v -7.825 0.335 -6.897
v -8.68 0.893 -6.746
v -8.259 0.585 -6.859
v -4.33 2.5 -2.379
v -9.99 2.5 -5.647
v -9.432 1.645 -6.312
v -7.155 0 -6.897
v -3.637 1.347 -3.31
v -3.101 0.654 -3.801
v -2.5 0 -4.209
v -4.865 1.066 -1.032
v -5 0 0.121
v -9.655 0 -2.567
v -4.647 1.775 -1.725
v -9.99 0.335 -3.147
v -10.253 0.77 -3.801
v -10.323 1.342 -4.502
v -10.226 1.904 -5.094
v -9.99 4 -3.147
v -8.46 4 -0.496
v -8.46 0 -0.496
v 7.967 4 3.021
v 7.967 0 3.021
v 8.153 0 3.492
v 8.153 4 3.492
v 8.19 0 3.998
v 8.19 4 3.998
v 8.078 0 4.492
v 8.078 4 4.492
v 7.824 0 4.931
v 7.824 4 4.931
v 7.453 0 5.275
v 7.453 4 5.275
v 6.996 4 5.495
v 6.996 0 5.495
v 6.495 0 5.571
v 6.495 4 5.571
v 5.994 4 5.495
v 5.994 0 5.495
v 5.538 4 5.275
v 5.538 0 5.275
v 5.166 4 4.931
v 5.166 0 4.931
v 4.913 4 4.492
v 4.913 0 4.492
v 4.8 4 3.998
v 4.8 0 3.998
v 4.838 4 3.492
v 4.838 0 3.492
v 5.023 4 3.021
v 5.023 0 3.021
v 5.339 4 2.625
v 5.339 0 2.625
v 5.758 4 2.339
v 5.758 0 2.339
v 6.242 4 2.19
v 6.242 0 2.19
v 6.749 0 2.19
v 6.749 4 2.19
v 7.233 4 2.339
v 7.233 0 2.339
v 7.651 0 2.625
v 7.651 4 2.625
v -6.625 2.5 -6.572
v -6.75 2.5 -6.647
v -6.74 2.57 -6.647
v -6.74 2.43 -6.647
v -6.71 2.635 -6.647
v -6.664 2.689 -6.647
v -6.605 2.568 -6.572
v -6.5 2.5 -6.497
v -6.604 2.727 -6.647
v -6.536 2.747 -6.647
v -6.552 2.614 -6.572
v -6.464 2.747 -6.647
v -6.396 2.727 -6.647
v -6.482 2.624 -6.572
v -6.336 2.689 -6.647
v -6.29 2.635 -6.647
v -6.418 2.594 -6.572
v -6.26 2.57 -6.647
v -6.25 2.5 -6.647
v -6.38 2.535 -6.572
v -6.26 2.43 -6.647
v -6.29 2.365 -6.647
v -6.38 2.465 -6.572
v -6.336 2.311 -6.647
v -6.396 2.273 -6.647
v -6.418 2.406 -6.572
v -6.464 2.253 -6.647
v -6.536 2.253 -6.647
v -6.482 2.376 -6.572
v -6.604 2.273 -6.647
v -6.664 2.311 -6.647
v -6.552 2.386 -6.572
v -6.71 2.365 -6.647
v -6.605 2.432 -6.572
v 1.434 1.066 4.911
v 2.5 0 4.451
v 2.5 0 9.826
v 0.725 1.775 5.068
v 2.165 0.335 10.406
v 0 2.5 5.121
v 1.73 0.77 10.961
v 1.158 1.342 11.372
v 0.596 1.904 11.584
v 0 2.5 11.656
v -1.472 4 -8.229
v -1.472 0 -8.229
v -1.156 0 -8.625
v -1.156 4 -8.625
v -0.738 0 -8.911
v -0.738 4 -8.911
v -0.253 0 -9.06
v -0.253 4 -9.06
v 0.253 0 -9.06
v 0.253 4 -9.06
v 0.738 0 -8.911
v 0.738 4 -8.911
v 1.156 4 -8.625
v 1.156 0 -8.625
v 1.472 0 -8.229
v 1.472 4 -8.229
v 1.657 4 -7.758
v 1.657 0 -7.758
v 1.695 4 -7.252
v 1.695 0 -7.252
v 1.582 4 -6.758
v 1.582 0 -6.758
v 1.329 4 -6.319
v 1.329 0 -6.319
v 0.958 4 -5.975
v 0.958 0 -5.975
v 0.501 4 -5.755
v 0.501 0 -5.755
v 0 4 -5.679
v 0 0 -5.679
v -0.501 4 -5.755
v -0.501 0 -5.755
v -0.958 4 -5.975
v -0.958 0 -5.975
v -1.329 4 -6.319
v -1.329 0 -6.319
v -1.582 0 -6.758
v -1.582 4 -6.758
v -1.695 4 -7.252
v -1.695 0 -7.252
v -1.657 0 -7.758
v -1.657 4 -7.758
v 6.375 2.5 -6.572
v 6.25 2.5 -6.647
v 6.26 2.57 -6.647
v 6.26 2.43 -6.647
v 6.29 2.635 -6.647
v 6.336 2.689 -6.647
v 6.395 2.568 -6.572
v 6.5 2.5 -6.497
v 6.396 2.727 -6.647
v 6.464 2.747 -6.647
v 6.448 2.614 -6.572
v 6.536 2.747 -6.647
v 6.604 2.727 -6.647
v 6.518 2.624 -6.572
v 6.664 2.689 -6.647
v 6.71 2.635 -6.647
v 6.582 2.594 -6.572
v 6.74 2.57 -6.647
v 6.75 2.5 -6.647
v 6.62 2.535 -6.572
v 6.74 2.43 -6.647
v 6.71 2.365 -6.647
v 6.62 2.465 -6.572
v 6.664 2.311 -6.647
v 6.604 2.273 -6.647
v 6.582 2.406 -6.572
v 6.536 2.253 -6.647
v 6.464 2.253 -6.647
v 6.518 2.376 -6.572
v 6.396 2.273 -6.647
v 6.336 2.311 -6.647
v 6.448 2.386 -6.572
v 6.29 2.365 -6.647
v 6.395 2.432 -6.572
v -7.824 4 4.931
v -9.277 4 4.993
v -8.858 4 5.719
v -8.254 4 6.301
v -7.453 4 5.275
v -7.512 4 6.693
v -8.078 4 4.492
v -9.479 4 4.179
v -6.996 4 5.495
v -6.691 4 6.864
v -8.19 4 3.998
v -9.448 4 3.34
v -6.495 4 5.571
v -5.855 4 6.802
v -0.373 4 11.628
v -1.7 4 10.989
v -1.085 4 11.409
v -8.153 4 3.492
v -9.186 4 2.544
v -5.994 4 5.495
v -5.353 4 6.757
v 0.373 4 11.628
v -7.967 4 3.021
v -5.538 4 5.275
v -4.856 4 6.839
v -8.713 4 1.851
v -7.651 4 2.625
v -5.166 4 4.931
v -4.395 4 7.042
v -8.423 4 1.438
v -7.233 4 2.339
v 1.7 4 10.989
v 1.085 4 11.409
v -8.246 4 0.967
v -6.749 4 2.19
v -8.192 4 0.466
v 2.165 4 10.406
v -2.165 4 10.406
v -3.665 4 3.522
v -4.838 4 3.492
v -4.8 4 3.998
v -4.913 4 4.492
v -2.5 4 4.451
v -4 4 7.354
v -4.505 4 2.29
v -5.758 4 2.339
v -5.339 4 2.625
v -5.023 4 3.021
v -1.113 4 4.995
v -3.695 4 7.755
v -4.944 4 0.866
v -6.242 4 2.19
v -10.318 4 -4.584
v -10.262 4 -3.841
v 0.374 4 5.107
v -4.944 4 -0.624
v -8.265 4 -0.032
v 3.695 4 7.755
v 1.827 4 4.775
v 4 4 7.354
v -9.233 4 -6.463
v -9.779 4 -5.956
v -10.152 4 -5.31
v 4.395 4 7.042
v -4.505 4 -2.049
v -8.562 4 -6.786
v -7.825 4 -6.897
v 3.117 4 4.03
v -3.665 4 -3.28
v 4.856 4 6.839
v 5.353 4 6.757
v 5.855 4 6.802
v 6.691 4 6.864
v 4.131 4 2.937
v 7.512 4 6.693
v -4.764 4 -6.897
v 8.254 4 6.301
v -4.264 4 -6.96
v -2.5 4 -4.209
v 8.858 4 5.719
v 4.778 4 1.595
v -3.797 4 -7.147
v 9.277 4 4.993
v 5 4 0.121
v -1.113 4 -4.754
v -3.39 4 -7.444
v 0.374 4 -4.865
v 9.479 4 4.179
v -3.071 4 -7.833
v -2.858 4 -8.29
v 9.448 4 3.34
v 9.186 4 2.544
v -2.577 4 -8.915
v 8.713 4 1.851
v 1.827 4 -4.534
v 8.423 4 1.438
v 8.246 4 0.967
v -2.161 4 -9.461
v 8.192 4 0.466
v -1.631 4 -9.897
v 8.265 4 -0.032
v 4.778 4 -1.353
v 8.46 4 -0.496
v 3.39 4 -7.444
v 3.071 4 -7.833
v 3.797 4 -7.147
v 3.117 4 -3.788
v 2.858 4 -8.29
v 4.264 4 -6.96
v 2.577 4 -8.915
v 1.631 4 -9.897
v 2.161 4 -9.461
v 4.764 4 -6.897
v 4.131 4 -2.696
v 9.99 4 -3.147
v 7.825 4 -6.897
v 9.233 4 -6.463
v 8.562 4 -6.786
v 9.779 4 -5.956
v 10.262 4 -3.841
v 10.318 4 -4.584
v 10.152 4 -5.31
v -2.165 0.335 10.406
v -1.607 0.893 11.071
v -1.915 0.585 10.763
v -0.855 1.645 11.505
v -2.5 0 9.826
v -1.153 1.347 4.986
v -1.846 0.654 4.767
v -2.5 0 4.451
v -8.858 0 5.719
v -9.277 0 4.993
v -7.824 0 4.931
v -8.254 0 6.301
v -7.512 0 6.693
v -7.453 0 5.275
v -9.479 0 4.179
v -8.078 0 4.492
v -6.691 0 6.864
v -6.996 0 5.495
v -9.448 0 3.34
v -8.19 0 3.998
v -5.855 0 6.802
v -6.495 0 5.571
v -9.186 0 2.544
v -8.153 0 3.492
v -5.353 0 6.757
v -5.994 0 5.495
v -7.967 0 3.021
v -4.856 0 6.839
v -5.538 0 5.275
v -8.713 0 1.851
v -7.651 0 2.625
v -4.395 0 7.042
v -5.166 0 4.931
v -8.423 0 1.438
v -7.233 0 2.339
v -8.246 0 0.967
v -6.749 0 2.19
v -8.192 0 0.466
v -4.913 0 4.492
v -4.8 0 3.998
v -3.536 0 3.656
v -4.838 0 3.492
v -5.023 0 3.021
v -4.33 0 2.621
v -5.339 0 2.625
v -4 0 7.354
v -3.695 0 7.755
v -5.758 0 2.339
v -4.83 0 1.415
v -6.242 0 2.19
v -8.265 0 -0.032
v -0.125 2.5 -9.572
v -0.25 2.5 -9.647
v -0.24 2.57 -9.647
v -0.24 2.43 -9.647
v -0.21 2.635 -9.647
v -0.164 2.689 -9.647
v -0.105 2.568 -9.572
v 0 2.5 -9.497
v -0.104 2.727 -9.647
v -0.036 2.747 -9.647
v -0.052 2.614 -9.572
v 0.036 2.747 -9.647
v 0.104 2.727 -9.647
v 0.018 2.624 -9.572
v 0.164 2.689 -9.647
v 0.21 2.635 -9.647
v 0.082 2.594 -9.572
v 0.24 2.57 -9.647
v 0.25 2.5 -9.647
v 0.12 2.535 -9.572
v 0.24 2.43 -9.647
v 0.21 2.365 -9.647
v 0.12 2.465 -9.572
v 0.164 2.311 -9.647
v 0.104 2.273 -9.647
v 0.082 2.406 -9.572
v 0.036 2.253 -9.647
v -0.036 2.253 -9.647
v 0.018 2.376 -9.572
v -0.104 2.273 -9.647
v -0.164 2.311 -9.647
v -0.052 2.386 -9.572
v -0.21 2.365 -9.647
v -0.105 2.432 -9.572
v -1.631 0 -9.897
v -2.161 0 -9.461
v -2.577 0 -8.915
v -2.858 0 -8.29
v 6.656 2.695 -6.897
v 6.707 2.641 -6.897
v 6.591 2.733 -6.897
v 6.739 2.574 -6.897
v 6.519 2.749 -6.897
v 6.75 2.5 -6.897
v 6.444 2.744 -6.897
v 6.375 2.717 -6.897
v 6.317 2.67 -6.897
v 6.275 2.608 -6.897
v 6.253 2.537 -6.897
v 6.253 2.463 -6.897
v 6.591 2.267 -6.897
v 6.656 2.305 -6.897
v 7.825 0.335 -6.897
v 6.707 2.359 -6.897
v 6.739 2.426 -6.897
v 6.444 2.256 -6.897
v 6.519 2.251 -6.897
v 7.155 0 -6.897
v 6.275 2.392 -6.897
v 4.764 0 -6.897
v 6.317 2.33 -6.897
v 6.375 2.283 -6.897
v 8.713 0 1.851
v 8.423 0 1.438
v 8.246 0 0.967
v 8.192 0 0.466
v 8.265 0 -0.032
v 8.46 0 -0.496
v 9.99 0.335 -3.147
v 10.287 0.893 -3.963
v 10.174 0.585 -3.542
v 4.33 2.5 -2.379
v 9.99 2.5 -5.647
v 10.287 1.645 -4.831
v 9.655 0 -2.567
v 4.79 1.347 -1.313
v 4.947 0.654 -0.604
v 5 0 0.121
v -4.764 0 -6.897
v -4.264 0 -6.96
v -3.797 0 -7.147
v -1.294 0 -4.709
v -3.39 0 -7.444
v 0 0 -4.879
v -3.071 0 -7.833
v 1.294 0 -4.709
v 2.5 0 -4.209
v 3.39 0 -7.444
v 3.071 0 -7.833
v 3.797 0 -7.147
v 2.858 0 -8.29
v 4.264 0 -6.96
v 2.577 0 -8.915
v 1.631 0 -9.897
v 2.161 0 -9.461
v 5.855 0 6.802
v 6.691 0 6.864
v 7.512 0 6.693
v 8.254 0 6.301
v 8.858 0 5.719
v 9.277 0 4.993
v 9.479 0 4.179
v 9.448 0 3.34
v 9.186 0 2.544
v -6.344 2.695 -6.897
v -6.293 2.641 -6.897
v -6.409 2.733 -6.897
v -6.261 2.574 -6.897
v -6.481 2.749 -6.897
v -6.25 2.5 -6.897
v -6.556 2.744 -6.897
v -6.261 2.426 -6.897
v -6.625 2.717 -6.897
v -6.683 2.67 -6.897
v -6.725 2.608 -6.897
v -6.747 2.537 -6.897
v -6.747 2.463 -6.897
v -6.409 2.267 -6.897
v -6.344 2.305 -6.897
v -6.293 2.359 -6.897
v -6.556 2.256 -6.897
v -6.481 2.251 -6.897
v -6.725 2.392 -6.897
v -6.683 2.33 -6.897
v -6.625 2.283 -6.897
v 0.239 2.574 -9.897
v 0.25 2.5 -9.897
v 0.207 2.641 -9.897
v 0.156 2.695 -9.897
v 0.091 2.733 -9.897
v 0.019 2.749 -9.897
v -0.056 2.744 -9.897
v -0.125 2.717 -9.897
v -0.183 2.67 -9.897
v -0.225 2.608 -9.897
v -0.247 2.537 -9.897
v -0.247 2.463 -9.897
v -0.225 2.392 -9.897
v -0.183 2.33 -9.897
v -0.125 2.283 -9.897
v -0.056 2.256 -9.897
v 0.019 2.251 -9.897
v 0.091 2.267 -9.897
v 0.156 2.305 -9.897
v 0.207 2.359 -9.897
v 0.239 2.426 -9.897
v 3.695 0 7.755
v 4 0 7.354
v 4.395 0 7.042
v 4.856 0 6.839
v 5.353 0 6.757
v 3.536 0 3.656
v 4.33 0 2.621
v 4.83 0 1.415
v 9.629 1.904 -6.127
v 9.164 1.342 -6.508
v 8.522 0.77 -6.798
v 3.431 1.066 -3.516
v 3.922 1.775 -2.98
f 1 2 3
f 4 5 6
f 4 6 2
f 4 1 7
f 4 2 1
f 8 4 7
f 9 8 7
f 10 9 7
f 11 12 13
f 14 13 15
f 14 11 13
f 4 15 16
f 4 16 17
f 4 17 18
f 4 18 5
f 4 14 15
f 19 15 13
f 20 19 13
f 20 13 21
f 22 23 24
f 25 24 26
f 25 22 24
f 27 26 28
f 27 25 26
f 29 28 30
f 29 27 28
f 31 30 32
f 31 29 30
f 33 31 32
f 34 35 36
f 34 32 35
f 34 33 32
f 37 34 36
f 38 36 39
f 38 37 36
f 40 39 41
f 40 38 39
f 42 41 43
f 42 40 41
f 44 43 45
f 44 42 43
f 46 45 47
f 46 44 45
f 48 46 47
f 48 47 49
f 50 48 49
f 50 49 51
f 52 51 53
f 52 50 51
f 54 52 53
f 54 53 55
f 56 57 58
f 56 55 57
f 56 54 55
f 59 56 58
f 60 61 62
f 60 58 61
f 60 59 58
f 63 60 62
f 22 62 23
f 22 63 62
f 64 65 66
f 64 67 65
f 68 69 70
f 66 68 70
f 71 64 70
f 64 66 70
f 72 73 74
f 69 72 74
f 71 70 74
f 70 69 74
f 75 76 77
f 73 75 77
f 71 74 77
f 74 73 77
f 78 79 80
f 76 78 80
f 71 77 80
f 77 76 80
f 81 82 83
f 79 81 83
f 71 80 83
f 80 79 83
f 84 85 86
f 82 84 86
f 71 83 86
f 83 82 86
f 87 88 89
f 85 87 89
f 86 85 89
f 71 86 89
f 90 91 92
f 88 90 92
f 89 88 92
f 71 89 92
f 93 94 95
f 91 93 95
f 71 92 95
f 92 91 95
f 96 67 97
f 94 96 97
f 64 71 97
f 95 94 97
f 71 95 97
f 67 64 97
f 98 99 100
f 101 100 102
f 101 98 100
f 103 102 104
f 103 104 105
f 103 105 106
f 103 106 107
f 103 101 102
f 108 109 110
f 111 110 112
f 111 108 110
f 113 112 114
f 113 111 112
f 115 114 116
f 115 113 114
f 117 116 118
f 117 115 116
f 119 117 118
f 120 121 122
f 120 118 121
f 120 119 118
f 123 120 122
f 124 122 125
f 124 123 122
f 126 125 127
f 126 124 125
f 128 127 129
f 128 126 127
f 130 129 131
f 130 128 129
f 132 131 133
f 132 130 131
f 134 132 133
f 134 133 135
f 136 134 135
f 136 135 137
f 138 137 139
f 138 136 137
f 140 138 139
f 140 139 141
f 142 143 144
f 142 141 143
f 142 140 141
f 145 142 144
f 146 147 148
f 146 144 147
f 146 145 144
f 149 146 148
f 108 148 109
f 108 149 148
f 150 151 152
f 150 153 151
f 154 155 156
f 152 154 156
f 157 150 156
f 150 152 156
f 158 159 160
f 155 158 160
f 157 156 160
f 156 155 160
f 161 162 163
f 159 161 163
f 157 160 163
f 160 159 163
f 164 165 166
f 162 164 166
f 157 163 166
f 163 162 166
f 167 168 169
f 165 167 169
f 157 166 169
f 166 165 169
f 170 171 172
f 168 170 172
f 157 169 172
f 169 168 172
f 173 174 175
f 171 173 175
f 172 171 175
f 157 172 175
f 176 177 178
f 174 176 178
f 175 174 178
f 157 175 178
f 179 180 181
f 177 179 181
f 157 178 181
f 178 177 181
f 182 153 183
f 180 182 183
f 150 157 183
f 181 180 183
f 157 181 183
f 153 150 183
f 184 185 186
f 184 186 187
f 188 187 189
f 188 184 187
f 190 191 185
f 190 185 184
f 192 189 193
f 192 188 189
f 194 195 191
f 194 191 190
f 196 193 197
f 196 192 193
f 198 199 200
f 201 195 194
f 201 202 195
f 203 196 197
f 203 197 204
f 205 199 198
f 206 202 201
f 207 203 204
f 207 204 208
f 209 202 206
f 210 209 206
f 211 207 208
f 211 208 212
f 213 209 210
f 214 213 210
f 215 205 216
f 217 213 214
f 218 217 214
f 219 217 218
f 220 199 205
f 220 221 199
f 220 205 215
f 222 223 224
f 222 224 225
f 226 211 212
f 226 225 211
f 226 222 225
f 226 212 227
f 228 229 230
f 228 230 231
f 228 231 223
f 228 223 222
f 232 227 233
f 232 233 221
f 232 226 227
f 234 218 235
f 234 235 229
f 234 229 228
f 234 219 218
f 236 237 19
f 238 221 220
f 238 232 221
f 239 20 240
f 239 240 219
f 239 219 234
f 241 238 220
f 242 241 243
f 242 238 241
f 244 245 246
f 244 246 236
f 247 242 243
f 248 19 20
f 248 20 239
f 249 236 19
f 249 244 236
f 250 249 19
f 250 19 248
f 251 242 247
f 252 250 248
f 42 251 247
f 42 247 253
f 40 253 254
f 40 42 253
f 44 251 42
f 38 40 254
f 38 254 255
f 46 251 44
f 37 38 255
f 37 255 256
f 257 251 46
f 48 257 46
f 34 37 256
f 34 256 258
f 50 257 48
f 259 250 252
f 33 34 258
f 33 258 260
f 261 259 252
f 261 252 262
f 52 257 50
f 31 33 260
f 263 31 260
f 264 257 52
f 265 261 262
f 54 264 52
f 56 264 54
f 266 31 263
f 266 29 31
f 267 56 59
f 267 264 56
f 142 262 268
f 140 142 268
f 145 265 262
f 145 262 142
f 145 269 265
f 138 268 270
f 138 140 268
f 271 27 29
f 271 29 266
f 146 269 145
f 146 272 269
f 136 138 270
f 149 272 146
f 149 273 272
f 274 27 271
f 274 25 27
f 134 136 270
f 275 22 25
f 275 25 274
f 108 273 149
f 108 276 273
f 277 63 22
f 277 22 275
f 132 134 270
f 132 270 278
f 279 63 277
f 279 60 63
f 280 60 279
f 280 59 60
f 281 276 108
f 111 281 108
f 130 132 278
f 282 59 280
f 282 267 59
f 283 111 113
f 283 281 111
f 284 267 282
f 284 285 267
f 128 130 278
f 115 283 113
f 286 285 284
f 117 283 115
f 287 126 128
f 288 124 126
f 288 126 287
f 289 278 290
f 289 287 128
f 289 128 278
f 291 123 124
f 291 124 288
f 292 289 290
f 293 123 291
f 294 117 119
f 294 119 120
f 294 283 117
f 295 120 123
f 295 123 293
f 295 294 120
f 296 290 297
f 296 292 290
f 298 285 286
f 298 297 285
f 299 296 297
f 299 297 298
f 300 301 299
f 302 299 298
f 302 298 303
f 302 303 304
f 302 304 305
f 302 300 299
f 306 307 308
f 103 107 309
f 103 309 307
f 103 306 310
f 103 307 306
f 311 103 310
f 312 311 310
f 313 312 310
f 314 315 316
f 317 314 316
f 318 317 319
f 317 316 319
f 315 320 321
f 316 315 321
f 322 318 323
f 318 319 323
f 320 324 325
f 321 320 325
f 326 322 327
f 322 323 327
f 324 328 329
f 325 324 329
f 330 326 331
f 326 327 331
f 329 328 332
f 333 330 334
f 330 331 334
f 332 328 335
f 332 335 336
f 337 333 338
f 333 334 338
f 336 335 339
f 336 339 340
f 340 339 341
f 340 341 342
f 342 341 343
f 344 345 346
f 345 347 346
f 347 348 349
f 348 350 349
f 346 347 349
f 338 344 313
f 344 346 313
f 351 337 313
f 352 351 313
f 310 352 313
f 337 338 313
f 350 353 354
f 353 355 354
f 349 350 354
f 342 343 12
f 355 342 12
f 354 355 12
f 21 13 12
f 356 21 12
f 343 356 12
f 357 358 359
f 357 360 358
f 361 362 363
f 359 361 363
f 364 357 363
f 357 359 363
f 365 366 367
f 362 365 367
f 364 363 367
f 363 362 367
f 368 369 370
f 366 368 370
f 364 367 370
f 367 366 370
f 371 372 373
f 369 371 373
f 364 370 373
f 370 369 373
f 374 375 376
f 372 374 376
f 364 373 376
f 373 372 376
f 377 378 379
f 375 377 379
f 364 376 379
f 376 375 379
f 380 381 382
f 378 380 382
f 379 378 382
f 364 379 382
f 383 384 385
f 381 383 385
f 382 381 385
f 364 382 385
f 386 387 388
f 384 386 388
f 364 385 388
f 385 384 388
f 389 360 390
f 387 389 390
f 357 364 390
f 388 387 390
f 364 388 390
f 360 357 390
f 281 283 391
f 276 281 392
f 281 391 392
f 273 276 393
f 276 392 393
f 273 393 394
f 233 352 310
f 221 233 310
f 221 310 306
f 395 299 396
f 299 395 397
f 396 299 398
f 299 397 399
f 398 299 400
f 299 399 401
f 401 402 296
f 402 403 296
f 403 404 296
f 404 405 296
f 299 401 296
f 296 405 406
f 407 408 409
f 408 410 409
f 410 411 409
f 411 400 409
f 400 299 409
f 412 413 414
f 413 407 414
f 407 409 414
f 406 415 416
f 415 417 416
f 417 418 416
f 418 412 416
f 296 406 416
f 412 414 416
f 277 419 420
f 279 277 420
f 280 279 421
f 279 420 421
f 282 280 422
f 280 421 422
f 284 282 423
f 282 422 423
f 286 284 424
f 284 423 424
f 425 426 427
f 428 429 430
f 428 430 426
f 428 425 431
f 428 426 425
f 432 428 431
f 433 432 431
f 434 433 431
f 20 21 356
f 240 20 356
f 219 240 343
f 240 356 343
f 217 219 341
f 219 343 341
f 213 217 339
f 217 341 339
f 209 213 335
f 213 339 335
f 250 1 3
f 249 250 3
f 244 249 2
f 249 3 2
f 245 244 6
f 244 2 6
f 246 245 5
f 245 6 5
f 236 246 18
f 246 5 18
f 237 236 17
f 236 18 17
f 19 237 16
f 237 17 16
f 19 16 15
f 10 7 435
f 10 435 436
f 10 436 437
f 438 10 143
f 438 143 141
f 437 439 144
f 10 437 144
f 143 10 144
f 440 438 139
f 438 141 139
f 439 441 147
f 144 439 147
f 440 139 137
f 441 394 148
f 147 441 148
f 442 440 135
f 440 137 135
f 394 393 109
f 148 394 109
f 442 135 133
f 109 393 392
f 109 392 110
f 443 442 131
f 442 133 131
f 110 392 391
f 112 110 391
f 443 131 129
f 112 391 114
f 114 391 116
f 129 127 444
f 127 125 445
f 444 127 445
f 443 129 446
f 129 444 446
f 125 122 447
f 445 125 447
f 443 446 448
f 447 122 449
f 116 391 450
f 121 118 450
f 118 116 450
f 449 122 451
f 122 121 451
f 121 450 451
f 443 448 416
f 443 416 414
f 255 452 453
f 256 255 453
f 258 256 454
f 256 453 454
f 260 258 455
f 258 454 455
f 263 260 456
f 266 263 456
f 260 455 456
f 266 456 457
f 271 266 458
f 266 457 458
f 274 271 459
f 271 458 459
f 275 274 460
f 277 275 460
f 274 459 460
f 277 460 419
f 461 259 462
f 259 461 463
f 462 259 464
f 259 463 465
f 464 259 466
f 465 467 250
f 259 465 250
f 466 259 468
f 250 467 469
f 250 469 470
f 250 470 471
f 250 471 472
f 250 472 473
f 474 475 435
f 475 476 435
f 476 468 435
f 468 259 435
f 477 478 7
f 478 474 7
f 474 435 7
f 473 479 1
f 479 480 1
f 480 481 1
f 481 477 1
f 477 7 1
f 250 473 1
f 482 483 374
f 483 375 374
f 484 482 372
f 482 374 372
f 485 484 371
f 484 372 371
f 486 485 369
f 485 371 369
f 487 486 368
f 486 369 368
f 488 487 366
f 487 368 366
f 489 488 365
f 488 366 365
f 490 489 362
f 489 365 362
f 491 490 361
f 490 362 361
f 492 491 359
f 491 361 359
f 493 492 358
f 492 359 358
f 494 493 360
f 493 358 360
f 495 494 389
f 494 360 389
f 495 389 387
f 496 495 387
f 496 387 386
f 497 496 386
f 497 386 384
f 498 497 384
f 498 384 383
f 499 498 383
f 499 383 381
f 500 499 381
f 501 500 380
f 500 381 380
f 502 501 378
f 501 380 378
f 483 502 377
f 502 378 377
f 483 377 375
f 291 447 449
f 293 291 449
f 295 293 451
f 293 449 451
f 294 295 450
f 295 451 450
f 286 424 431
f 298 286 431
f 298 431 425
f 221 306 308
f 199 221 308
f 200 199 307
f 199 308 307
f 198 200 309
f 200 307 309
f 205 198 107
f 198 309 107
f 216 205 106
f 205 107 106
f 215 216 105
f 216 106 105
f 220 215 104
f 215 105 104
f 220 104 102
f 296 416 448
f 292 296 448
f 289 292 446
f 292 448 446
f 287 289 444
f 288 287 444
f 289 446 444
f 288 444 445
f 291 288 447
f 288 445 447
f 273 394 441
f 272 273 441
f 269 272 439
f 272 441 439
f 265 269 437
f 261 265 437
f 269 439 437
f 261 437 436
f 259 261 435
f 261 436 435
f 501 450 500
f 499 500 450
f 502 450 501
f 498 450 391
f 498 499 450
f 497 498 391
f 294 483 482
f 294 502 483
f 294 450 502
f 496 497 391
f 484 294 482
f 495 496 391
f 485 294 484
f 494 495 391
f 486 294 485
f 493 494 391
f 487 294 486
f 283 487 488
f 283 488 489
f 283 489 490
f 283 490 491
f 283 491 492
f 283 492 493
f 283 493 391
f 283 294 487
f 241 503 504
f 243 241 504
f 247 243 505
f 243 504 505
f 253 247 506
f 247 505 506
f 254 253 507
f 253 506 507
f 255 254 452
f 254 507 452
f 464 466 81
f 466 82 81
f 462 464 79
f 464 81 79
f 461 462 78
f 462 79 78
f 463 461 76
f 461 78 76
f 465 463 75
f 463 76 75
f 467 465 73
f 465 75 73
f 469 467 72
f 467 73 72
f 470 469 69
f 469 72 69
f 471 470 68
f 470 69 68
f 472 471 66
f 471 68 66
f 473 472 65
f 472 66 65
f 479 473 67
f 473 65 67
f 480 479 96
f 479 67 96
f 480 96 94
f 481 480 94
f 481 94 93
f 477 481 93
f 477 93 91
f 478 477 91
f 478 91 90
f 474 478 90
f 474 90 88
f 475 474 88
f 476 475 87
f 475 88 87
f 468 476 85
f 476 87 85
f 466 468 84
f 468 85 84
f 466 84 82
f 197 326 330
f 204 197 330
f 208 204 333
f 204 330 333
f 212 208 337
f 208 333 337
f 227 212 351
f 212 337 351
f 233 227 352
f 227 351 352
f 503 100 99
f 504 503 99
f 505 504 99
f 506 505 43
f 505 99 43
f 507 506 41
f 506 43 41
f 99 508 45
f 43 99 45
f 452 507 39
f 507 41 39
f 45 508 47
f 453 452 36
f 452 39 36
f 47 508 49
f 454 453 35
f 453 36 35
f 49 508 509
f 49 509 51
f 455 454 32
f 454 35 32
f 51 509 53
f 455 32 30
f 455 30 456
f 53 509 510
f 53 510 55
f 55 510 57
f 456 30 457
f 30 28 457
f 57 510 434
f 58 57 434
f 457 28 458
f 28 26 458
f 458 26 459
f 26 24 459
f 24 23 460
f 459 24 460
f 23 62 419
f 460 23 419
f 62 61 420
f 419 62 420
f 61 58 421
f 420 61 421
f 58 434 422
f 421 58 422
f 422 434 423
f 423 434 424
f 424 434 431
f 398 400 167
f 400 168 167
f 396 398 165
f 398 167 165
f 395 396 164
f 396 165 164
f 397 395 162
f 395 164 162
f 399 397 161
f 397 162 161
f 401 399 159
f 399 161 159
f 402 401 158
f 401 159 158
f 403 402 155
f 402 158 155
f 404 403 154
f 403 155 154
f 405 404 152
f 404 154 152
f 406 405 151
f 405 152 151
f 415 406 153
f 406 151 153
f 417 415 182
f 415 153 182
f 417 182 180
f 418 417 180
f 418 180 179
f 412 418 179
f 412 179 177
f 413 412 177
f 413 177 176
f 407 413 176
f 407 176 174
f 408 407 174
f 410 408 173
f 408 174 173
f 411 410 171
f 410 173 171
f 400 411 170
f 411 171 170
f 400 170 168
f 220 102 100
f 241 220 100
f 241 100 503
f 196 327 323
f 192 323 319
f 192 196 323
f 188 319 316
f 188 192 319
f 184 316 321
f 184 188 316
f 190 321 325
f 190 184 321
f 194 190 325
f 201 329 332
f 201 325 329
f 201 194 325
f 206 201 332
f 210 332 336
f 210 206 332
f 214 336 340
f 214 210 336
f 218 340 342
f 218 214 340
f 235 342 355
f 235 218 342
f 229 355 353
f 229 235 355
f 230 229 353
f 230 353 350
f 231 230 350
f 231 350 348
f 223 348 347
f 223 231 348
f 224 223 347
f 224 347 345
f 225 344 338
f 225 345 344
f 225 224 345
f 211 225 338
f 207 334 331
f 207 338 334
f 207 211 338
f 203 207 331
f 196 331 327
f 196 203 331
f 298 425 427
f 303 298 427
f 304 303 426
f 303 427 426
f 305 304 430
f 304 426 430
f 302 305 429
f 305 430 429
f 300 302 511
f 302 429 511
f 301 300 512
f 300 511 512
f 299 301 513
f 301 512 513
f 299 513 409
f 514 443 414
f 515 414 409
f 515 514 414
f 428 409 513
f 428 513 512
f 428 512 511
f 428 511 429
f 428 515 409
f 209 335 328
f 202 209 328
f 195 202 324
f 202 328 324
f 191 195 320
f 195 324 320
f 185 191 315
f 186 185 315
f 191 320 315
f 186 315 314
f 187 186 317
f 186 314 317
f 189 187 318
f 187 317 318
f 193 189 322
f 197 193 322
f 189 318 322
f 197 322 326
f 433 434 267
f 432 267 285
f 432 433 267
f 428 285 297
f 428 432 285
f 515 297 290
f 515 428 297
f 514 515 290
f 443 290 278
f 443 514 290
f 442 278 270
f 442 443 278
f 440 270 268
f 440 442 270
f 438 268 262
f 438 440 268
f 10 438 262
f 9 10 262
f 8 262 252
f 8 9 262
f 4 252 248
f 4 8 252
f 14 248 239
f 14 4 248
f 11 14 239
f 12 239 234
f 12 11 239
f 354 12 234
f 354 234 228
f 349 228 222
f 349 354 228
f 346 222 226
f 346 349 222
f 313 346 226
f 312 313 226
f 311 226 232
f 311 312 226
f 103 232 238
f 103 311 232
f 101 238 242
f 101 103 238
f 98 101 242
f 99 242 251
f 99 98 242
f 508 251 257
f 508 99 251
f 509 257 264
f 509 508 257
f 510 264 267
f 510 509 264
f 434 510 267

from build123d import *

# Parameters (mm, degrees)
SKETCH1_R                      = 5
EXTRUDE1_DEPTH                 = 4
CIRPATTERN2_COUNT              = 3
EXTRUDE4_START                 = 4.45086
EXTRUDE4_DEPTH                 = 7.205259
EXTRUDE5_START                 = 4.330127
EXTRUDE5_DEPTH                 = 7.205258
EXTRUDE6_START                 = 4.330127
EXTRUDE6_DEPTH                 = 7.205258
SKETCH11_W                     = 14.943105969
SKETCH11_H                     = 2.182700872
EXTRUDE7_DEPTH                 = 10
F_0_5_0_5_DIAMETER_HOLE1_D     = 0.5
F_0_5_0_5_DIAMETER_HOLE1_DEPTH = 0.25
F_0_5_0_5_DIAMETER_HOLE1_TIP   = 0.150215155
F_0_5_0_5_DIAMETER_HOLE2_D     = 0.5
F_0_5_0_5_DIAMETER_HOLE2_DEPTH = 0.25
F_0_5_0_5_DIAMETER_HOLE2_TIP   = 0.150215155
F_0_5_0_5_DIAMETER_HOLE3_D     = 0.5
F_0_5_0_5_DIAMETER_HOLE3_DEPTH = 0.25
F_0_5_0_5_DIAMETER_HOLE3_TIP   = 0.150215155


with BuildPart() as part:
    # Sketch1 → Extrude1 (new body)
    with BuildSketch(Plane(origin=(0, 0, 0), x_dir=(1, 0, 0), z_dir=(0, 1, 0))):
        with BuildLine():
            Line((-9.989936491, 3.146959138), (-8.459547932, 0.4962484))
            ThreePointArc((-8.459547932, 0.4962484), (-8.203164753, -0.718531203), (-8.713035455, -1.850544314))
            ThreePointArc((-8.713035455, -1.850544314), (-9.09326674, -5.370733384), (-5.854577936, -6.801537968))
            ThreePointArc((-5.854577936, -6.801537968), (-4.619290473, -6.925983542), (-3.695452068, -7.75540769))
            Line((-3.695452068, -7.75540769), (-2.165063509, -10.406118428))
            ThreePointArc((-2.165063509, -10.406118428), (0, -11.656118428), (2.165063509, -10.406118428))
            Line((2.165063509, -10.406118428), (3.695452068, -7.75540769))
            ThreePointArc((3.695452068, -7.75540769), (4.619290473, -6.925983542), (5.854577936, -6.801537968))
            ThreePointArc((5.854577936, -6.801537968), (9.09326674, -5.370733384), (8.713035455, -1.850544314))
            ThreePointArc((8.713035455, -1.850544314), (8.203164753, -0.718531203), (8.459547932, 0.4962484))
            Line((8.459547932, 0.4962484), (9.989936491, 3.146959138))
            ThreePointArc((9.989936491, 3.146959138), (9.989936491, 5.646959138), (7.824872981, 6.896959138))
            Line((7.824872981, 6.896959138), (4.764095865, 6.896959138))
            ThreePointArc((4.764095865, 6.896959138), (3.583874279, 7.282314592), (2.858457519, 8.289882129))
            ThreePointArc((2.858457519, 8.289882129), (0, 10.379266616), (-2.858457519, 8.289882129))
            ThreePointArc((-2.858457519, 8.289882129), (-3.583874279, 7.282314592), (-4.764095865, 6.896959138))
            Line((-4.764095865, 6.896959138), (-7.824872981, 6.896959138))
            ThreePointArc((-7.824872981, 6.896959138), (-9.989936491, 5.646959138), (-9.989936491, 3.146959138))
        make_face()
        with Locations((0, -0.120733384)):
            Circle(SKETCH1_R, mode=Mode.SUBTRACT)
    extrude(amount=EXTRUDE1_DEPTH)

    # Sketch6 → M3 Clearance Hole1 (revolve, cut)
    with BuildSketch(Plane(origin=(-6.495190528, 4, 3.870733384), x_dir=(0, 0, 1), z_dir=(1, 0, 0))):
        Polygon((0, 0), (0, 11.021463052), (1.7, 10), (1.7, 0), align=None)
    m3_clearance_hole1 = revolve(axis=Axis((-6.495190528, 10.35, 3.870733384), (0, -1, 0)), mode=Mode.SUBTRACT)

    # CirPattern2: M3 Clearance Hole1 ×3 about axis
    cirpattern2_axis = Axis((0, 0, 0.120733384), (0, 1, 0))
    for i in range(1, CIRPATTERN2_COUNT):
        add(m3_clearance_hole1.rotate(cirpattern2_axis, i * 360 / CIRPATTERN2_COUNT), mode=Mode.SUBTRACT)

    # GrooveSketch → Extrude4 (cut)
    with BuildSketch(Plane.XY.offset(EXTRUDE4_START)):
        Polygon((28.569876563, -26.069876563), (2.5, 0), (0, 2.5), (-2.5, 0), (-28.569876563, -26.069876563), (-28.569876563, -99.806622573), (28.569876563, -99.806622573), align=None)
    extrude(amount=EXTRUDE4_DEPTH, mode=Mode.SUBTRACT)

    # Sketch9 → Extrude5 (cut)
    with BuildSketch(Plane(origin=(0.052279089, 0, 0.030183346), x_dir=(-0.5, 0, 0.866025404), z_dir=(-0.866025404, 0, -0.5)).offset(EXTRUDE5_START)):
        Polygon((35.272745822, -32.668187644), (2.604558178, 0), (0.104558178, 2.5), (-2.395441822, 0), (-35.063629467, -32.668187644), (-35.063629467, -125.067775694), (35.272745822, -125.067775694), align=None)
    extrude(amount=EXTRUDE5_DEPTH, mode=Mode.SUBTRACT)

    # Sketch10 → Extrude6 (cut)
    with BuildSketch(Plane(origin=(-0.052279089, 0, 0.030183346), x_dir=(-0.5, 0, -0.866025404), z_dir=(0.866025404, 0, -0.5)).offset(EXTRUDE6_START)):
        Polygon((35.063629467, -32.668187644), (2.395441822, 0), (-0.104558178, 2.5), (-2.604558178, 0), (-35.272745822, -32.668187644), (-35.272745822, -125.067775694), (35.063629467, -125.067775694), align=None)
    extrude(amount=EXTRUDE6_DEPTH, mode=Mode.SUBTRACT)

    # Sketch11 → Extrude7 (cut)
    with BuildSketch(Plane(origin=(0, 4, 0), x_dir=(-1, 0, 0), z_dir=(0, 1, 0))):
        with Locations((-0.195883412, -10.988309574)):
            Rectangle(SKETCH11_W, SKETCH11_H)
    extrude(amount=-EXTRUDE7_DEPTH, mode=Mode.SUBTRACT)

    # Ø0.5 (0.5) Diameter Hole1
    with Locations(Plane(origin=(0, 2.5, -9.896959138), x_dir=(-1, 0, 0), z_dir=(0, 0, -1))):
        with Locations((0, 0)):
            Hole(F_0_5_0_5_DIAMETER_HOLE1_D / 2, depth=F_0_5_0_5_DIAMETER_HOLE1_DEPTH)
            with Locations((0, 0, -(F_0_5_0_5_DIAMETER_HOLE1_DEPTH + F_0_5_0_5_DIAMETER_HOLE1_TIP / 2))):  # 118° drill point
                Cone(0, F_0_5_0_5_DIAMETER_HOLE1_D / 2, F_0_5_0_5_DIAMETER_HOLE1_TIP, mode=Mode.SUBTRACT)

    # Ø0.5 (0.5) Diameter Hole2
    with Locations(Plane(origin=(6.5, 2.5, -6.896959138), x_dir=(-1, 0, 0), z_dir=(0, 0, -1))):
        with Locations((0, 0)):
            Hole(F_0_5_0_5_DIAMETER_HOLE2_D / 2, depth=F_0_5_0_5_DIAMETER_HOLE2_DEPTH)
            with Locations((0, 0, -(F_0_5_0_5_DIAMETER_HOLE2_DEPTH + F_0_5_0_5_DIAMETER_HOLE2_TIP / 2))):  # 118° drill point
                Cone(0, F_0_5_0_5_DIAMETER_HOLE2_D / 2, F_0_5_0_5_DIAMETER_HOLE2_TIP, mode=Mode.SUBTRACT)

    # Ø0.5 (0.5) Diameter Hole3
    with Locations(Plane(origin=(-6.5, 2.5, -6.896959138), x_dir=(-1, 0, 0), z_dir=(0, 0, -1))):
        with Locations((0, 0)):
            Hole(F_0_5_0_5_DIAMETER_HOLE3_D / 2, depth=F_0_5_0_5_DIAMETER_HOLE3_DEPTH)
            with Locations((0, 0, -(F_0_5_0_5_DIAMETER_HOLE3_DEPTH + F_0_5_0_5_DIAMETER_HOLE3_TIP / 2))):  # 118° drill point
                Cone(0, F_0_5_0_5_DIAMETER_HOLE3_D / 2, F_0_5_0_5_DIAMETER_HOLE3_TIP, mode=Mode.SUBTRACT)


solid = part.part
